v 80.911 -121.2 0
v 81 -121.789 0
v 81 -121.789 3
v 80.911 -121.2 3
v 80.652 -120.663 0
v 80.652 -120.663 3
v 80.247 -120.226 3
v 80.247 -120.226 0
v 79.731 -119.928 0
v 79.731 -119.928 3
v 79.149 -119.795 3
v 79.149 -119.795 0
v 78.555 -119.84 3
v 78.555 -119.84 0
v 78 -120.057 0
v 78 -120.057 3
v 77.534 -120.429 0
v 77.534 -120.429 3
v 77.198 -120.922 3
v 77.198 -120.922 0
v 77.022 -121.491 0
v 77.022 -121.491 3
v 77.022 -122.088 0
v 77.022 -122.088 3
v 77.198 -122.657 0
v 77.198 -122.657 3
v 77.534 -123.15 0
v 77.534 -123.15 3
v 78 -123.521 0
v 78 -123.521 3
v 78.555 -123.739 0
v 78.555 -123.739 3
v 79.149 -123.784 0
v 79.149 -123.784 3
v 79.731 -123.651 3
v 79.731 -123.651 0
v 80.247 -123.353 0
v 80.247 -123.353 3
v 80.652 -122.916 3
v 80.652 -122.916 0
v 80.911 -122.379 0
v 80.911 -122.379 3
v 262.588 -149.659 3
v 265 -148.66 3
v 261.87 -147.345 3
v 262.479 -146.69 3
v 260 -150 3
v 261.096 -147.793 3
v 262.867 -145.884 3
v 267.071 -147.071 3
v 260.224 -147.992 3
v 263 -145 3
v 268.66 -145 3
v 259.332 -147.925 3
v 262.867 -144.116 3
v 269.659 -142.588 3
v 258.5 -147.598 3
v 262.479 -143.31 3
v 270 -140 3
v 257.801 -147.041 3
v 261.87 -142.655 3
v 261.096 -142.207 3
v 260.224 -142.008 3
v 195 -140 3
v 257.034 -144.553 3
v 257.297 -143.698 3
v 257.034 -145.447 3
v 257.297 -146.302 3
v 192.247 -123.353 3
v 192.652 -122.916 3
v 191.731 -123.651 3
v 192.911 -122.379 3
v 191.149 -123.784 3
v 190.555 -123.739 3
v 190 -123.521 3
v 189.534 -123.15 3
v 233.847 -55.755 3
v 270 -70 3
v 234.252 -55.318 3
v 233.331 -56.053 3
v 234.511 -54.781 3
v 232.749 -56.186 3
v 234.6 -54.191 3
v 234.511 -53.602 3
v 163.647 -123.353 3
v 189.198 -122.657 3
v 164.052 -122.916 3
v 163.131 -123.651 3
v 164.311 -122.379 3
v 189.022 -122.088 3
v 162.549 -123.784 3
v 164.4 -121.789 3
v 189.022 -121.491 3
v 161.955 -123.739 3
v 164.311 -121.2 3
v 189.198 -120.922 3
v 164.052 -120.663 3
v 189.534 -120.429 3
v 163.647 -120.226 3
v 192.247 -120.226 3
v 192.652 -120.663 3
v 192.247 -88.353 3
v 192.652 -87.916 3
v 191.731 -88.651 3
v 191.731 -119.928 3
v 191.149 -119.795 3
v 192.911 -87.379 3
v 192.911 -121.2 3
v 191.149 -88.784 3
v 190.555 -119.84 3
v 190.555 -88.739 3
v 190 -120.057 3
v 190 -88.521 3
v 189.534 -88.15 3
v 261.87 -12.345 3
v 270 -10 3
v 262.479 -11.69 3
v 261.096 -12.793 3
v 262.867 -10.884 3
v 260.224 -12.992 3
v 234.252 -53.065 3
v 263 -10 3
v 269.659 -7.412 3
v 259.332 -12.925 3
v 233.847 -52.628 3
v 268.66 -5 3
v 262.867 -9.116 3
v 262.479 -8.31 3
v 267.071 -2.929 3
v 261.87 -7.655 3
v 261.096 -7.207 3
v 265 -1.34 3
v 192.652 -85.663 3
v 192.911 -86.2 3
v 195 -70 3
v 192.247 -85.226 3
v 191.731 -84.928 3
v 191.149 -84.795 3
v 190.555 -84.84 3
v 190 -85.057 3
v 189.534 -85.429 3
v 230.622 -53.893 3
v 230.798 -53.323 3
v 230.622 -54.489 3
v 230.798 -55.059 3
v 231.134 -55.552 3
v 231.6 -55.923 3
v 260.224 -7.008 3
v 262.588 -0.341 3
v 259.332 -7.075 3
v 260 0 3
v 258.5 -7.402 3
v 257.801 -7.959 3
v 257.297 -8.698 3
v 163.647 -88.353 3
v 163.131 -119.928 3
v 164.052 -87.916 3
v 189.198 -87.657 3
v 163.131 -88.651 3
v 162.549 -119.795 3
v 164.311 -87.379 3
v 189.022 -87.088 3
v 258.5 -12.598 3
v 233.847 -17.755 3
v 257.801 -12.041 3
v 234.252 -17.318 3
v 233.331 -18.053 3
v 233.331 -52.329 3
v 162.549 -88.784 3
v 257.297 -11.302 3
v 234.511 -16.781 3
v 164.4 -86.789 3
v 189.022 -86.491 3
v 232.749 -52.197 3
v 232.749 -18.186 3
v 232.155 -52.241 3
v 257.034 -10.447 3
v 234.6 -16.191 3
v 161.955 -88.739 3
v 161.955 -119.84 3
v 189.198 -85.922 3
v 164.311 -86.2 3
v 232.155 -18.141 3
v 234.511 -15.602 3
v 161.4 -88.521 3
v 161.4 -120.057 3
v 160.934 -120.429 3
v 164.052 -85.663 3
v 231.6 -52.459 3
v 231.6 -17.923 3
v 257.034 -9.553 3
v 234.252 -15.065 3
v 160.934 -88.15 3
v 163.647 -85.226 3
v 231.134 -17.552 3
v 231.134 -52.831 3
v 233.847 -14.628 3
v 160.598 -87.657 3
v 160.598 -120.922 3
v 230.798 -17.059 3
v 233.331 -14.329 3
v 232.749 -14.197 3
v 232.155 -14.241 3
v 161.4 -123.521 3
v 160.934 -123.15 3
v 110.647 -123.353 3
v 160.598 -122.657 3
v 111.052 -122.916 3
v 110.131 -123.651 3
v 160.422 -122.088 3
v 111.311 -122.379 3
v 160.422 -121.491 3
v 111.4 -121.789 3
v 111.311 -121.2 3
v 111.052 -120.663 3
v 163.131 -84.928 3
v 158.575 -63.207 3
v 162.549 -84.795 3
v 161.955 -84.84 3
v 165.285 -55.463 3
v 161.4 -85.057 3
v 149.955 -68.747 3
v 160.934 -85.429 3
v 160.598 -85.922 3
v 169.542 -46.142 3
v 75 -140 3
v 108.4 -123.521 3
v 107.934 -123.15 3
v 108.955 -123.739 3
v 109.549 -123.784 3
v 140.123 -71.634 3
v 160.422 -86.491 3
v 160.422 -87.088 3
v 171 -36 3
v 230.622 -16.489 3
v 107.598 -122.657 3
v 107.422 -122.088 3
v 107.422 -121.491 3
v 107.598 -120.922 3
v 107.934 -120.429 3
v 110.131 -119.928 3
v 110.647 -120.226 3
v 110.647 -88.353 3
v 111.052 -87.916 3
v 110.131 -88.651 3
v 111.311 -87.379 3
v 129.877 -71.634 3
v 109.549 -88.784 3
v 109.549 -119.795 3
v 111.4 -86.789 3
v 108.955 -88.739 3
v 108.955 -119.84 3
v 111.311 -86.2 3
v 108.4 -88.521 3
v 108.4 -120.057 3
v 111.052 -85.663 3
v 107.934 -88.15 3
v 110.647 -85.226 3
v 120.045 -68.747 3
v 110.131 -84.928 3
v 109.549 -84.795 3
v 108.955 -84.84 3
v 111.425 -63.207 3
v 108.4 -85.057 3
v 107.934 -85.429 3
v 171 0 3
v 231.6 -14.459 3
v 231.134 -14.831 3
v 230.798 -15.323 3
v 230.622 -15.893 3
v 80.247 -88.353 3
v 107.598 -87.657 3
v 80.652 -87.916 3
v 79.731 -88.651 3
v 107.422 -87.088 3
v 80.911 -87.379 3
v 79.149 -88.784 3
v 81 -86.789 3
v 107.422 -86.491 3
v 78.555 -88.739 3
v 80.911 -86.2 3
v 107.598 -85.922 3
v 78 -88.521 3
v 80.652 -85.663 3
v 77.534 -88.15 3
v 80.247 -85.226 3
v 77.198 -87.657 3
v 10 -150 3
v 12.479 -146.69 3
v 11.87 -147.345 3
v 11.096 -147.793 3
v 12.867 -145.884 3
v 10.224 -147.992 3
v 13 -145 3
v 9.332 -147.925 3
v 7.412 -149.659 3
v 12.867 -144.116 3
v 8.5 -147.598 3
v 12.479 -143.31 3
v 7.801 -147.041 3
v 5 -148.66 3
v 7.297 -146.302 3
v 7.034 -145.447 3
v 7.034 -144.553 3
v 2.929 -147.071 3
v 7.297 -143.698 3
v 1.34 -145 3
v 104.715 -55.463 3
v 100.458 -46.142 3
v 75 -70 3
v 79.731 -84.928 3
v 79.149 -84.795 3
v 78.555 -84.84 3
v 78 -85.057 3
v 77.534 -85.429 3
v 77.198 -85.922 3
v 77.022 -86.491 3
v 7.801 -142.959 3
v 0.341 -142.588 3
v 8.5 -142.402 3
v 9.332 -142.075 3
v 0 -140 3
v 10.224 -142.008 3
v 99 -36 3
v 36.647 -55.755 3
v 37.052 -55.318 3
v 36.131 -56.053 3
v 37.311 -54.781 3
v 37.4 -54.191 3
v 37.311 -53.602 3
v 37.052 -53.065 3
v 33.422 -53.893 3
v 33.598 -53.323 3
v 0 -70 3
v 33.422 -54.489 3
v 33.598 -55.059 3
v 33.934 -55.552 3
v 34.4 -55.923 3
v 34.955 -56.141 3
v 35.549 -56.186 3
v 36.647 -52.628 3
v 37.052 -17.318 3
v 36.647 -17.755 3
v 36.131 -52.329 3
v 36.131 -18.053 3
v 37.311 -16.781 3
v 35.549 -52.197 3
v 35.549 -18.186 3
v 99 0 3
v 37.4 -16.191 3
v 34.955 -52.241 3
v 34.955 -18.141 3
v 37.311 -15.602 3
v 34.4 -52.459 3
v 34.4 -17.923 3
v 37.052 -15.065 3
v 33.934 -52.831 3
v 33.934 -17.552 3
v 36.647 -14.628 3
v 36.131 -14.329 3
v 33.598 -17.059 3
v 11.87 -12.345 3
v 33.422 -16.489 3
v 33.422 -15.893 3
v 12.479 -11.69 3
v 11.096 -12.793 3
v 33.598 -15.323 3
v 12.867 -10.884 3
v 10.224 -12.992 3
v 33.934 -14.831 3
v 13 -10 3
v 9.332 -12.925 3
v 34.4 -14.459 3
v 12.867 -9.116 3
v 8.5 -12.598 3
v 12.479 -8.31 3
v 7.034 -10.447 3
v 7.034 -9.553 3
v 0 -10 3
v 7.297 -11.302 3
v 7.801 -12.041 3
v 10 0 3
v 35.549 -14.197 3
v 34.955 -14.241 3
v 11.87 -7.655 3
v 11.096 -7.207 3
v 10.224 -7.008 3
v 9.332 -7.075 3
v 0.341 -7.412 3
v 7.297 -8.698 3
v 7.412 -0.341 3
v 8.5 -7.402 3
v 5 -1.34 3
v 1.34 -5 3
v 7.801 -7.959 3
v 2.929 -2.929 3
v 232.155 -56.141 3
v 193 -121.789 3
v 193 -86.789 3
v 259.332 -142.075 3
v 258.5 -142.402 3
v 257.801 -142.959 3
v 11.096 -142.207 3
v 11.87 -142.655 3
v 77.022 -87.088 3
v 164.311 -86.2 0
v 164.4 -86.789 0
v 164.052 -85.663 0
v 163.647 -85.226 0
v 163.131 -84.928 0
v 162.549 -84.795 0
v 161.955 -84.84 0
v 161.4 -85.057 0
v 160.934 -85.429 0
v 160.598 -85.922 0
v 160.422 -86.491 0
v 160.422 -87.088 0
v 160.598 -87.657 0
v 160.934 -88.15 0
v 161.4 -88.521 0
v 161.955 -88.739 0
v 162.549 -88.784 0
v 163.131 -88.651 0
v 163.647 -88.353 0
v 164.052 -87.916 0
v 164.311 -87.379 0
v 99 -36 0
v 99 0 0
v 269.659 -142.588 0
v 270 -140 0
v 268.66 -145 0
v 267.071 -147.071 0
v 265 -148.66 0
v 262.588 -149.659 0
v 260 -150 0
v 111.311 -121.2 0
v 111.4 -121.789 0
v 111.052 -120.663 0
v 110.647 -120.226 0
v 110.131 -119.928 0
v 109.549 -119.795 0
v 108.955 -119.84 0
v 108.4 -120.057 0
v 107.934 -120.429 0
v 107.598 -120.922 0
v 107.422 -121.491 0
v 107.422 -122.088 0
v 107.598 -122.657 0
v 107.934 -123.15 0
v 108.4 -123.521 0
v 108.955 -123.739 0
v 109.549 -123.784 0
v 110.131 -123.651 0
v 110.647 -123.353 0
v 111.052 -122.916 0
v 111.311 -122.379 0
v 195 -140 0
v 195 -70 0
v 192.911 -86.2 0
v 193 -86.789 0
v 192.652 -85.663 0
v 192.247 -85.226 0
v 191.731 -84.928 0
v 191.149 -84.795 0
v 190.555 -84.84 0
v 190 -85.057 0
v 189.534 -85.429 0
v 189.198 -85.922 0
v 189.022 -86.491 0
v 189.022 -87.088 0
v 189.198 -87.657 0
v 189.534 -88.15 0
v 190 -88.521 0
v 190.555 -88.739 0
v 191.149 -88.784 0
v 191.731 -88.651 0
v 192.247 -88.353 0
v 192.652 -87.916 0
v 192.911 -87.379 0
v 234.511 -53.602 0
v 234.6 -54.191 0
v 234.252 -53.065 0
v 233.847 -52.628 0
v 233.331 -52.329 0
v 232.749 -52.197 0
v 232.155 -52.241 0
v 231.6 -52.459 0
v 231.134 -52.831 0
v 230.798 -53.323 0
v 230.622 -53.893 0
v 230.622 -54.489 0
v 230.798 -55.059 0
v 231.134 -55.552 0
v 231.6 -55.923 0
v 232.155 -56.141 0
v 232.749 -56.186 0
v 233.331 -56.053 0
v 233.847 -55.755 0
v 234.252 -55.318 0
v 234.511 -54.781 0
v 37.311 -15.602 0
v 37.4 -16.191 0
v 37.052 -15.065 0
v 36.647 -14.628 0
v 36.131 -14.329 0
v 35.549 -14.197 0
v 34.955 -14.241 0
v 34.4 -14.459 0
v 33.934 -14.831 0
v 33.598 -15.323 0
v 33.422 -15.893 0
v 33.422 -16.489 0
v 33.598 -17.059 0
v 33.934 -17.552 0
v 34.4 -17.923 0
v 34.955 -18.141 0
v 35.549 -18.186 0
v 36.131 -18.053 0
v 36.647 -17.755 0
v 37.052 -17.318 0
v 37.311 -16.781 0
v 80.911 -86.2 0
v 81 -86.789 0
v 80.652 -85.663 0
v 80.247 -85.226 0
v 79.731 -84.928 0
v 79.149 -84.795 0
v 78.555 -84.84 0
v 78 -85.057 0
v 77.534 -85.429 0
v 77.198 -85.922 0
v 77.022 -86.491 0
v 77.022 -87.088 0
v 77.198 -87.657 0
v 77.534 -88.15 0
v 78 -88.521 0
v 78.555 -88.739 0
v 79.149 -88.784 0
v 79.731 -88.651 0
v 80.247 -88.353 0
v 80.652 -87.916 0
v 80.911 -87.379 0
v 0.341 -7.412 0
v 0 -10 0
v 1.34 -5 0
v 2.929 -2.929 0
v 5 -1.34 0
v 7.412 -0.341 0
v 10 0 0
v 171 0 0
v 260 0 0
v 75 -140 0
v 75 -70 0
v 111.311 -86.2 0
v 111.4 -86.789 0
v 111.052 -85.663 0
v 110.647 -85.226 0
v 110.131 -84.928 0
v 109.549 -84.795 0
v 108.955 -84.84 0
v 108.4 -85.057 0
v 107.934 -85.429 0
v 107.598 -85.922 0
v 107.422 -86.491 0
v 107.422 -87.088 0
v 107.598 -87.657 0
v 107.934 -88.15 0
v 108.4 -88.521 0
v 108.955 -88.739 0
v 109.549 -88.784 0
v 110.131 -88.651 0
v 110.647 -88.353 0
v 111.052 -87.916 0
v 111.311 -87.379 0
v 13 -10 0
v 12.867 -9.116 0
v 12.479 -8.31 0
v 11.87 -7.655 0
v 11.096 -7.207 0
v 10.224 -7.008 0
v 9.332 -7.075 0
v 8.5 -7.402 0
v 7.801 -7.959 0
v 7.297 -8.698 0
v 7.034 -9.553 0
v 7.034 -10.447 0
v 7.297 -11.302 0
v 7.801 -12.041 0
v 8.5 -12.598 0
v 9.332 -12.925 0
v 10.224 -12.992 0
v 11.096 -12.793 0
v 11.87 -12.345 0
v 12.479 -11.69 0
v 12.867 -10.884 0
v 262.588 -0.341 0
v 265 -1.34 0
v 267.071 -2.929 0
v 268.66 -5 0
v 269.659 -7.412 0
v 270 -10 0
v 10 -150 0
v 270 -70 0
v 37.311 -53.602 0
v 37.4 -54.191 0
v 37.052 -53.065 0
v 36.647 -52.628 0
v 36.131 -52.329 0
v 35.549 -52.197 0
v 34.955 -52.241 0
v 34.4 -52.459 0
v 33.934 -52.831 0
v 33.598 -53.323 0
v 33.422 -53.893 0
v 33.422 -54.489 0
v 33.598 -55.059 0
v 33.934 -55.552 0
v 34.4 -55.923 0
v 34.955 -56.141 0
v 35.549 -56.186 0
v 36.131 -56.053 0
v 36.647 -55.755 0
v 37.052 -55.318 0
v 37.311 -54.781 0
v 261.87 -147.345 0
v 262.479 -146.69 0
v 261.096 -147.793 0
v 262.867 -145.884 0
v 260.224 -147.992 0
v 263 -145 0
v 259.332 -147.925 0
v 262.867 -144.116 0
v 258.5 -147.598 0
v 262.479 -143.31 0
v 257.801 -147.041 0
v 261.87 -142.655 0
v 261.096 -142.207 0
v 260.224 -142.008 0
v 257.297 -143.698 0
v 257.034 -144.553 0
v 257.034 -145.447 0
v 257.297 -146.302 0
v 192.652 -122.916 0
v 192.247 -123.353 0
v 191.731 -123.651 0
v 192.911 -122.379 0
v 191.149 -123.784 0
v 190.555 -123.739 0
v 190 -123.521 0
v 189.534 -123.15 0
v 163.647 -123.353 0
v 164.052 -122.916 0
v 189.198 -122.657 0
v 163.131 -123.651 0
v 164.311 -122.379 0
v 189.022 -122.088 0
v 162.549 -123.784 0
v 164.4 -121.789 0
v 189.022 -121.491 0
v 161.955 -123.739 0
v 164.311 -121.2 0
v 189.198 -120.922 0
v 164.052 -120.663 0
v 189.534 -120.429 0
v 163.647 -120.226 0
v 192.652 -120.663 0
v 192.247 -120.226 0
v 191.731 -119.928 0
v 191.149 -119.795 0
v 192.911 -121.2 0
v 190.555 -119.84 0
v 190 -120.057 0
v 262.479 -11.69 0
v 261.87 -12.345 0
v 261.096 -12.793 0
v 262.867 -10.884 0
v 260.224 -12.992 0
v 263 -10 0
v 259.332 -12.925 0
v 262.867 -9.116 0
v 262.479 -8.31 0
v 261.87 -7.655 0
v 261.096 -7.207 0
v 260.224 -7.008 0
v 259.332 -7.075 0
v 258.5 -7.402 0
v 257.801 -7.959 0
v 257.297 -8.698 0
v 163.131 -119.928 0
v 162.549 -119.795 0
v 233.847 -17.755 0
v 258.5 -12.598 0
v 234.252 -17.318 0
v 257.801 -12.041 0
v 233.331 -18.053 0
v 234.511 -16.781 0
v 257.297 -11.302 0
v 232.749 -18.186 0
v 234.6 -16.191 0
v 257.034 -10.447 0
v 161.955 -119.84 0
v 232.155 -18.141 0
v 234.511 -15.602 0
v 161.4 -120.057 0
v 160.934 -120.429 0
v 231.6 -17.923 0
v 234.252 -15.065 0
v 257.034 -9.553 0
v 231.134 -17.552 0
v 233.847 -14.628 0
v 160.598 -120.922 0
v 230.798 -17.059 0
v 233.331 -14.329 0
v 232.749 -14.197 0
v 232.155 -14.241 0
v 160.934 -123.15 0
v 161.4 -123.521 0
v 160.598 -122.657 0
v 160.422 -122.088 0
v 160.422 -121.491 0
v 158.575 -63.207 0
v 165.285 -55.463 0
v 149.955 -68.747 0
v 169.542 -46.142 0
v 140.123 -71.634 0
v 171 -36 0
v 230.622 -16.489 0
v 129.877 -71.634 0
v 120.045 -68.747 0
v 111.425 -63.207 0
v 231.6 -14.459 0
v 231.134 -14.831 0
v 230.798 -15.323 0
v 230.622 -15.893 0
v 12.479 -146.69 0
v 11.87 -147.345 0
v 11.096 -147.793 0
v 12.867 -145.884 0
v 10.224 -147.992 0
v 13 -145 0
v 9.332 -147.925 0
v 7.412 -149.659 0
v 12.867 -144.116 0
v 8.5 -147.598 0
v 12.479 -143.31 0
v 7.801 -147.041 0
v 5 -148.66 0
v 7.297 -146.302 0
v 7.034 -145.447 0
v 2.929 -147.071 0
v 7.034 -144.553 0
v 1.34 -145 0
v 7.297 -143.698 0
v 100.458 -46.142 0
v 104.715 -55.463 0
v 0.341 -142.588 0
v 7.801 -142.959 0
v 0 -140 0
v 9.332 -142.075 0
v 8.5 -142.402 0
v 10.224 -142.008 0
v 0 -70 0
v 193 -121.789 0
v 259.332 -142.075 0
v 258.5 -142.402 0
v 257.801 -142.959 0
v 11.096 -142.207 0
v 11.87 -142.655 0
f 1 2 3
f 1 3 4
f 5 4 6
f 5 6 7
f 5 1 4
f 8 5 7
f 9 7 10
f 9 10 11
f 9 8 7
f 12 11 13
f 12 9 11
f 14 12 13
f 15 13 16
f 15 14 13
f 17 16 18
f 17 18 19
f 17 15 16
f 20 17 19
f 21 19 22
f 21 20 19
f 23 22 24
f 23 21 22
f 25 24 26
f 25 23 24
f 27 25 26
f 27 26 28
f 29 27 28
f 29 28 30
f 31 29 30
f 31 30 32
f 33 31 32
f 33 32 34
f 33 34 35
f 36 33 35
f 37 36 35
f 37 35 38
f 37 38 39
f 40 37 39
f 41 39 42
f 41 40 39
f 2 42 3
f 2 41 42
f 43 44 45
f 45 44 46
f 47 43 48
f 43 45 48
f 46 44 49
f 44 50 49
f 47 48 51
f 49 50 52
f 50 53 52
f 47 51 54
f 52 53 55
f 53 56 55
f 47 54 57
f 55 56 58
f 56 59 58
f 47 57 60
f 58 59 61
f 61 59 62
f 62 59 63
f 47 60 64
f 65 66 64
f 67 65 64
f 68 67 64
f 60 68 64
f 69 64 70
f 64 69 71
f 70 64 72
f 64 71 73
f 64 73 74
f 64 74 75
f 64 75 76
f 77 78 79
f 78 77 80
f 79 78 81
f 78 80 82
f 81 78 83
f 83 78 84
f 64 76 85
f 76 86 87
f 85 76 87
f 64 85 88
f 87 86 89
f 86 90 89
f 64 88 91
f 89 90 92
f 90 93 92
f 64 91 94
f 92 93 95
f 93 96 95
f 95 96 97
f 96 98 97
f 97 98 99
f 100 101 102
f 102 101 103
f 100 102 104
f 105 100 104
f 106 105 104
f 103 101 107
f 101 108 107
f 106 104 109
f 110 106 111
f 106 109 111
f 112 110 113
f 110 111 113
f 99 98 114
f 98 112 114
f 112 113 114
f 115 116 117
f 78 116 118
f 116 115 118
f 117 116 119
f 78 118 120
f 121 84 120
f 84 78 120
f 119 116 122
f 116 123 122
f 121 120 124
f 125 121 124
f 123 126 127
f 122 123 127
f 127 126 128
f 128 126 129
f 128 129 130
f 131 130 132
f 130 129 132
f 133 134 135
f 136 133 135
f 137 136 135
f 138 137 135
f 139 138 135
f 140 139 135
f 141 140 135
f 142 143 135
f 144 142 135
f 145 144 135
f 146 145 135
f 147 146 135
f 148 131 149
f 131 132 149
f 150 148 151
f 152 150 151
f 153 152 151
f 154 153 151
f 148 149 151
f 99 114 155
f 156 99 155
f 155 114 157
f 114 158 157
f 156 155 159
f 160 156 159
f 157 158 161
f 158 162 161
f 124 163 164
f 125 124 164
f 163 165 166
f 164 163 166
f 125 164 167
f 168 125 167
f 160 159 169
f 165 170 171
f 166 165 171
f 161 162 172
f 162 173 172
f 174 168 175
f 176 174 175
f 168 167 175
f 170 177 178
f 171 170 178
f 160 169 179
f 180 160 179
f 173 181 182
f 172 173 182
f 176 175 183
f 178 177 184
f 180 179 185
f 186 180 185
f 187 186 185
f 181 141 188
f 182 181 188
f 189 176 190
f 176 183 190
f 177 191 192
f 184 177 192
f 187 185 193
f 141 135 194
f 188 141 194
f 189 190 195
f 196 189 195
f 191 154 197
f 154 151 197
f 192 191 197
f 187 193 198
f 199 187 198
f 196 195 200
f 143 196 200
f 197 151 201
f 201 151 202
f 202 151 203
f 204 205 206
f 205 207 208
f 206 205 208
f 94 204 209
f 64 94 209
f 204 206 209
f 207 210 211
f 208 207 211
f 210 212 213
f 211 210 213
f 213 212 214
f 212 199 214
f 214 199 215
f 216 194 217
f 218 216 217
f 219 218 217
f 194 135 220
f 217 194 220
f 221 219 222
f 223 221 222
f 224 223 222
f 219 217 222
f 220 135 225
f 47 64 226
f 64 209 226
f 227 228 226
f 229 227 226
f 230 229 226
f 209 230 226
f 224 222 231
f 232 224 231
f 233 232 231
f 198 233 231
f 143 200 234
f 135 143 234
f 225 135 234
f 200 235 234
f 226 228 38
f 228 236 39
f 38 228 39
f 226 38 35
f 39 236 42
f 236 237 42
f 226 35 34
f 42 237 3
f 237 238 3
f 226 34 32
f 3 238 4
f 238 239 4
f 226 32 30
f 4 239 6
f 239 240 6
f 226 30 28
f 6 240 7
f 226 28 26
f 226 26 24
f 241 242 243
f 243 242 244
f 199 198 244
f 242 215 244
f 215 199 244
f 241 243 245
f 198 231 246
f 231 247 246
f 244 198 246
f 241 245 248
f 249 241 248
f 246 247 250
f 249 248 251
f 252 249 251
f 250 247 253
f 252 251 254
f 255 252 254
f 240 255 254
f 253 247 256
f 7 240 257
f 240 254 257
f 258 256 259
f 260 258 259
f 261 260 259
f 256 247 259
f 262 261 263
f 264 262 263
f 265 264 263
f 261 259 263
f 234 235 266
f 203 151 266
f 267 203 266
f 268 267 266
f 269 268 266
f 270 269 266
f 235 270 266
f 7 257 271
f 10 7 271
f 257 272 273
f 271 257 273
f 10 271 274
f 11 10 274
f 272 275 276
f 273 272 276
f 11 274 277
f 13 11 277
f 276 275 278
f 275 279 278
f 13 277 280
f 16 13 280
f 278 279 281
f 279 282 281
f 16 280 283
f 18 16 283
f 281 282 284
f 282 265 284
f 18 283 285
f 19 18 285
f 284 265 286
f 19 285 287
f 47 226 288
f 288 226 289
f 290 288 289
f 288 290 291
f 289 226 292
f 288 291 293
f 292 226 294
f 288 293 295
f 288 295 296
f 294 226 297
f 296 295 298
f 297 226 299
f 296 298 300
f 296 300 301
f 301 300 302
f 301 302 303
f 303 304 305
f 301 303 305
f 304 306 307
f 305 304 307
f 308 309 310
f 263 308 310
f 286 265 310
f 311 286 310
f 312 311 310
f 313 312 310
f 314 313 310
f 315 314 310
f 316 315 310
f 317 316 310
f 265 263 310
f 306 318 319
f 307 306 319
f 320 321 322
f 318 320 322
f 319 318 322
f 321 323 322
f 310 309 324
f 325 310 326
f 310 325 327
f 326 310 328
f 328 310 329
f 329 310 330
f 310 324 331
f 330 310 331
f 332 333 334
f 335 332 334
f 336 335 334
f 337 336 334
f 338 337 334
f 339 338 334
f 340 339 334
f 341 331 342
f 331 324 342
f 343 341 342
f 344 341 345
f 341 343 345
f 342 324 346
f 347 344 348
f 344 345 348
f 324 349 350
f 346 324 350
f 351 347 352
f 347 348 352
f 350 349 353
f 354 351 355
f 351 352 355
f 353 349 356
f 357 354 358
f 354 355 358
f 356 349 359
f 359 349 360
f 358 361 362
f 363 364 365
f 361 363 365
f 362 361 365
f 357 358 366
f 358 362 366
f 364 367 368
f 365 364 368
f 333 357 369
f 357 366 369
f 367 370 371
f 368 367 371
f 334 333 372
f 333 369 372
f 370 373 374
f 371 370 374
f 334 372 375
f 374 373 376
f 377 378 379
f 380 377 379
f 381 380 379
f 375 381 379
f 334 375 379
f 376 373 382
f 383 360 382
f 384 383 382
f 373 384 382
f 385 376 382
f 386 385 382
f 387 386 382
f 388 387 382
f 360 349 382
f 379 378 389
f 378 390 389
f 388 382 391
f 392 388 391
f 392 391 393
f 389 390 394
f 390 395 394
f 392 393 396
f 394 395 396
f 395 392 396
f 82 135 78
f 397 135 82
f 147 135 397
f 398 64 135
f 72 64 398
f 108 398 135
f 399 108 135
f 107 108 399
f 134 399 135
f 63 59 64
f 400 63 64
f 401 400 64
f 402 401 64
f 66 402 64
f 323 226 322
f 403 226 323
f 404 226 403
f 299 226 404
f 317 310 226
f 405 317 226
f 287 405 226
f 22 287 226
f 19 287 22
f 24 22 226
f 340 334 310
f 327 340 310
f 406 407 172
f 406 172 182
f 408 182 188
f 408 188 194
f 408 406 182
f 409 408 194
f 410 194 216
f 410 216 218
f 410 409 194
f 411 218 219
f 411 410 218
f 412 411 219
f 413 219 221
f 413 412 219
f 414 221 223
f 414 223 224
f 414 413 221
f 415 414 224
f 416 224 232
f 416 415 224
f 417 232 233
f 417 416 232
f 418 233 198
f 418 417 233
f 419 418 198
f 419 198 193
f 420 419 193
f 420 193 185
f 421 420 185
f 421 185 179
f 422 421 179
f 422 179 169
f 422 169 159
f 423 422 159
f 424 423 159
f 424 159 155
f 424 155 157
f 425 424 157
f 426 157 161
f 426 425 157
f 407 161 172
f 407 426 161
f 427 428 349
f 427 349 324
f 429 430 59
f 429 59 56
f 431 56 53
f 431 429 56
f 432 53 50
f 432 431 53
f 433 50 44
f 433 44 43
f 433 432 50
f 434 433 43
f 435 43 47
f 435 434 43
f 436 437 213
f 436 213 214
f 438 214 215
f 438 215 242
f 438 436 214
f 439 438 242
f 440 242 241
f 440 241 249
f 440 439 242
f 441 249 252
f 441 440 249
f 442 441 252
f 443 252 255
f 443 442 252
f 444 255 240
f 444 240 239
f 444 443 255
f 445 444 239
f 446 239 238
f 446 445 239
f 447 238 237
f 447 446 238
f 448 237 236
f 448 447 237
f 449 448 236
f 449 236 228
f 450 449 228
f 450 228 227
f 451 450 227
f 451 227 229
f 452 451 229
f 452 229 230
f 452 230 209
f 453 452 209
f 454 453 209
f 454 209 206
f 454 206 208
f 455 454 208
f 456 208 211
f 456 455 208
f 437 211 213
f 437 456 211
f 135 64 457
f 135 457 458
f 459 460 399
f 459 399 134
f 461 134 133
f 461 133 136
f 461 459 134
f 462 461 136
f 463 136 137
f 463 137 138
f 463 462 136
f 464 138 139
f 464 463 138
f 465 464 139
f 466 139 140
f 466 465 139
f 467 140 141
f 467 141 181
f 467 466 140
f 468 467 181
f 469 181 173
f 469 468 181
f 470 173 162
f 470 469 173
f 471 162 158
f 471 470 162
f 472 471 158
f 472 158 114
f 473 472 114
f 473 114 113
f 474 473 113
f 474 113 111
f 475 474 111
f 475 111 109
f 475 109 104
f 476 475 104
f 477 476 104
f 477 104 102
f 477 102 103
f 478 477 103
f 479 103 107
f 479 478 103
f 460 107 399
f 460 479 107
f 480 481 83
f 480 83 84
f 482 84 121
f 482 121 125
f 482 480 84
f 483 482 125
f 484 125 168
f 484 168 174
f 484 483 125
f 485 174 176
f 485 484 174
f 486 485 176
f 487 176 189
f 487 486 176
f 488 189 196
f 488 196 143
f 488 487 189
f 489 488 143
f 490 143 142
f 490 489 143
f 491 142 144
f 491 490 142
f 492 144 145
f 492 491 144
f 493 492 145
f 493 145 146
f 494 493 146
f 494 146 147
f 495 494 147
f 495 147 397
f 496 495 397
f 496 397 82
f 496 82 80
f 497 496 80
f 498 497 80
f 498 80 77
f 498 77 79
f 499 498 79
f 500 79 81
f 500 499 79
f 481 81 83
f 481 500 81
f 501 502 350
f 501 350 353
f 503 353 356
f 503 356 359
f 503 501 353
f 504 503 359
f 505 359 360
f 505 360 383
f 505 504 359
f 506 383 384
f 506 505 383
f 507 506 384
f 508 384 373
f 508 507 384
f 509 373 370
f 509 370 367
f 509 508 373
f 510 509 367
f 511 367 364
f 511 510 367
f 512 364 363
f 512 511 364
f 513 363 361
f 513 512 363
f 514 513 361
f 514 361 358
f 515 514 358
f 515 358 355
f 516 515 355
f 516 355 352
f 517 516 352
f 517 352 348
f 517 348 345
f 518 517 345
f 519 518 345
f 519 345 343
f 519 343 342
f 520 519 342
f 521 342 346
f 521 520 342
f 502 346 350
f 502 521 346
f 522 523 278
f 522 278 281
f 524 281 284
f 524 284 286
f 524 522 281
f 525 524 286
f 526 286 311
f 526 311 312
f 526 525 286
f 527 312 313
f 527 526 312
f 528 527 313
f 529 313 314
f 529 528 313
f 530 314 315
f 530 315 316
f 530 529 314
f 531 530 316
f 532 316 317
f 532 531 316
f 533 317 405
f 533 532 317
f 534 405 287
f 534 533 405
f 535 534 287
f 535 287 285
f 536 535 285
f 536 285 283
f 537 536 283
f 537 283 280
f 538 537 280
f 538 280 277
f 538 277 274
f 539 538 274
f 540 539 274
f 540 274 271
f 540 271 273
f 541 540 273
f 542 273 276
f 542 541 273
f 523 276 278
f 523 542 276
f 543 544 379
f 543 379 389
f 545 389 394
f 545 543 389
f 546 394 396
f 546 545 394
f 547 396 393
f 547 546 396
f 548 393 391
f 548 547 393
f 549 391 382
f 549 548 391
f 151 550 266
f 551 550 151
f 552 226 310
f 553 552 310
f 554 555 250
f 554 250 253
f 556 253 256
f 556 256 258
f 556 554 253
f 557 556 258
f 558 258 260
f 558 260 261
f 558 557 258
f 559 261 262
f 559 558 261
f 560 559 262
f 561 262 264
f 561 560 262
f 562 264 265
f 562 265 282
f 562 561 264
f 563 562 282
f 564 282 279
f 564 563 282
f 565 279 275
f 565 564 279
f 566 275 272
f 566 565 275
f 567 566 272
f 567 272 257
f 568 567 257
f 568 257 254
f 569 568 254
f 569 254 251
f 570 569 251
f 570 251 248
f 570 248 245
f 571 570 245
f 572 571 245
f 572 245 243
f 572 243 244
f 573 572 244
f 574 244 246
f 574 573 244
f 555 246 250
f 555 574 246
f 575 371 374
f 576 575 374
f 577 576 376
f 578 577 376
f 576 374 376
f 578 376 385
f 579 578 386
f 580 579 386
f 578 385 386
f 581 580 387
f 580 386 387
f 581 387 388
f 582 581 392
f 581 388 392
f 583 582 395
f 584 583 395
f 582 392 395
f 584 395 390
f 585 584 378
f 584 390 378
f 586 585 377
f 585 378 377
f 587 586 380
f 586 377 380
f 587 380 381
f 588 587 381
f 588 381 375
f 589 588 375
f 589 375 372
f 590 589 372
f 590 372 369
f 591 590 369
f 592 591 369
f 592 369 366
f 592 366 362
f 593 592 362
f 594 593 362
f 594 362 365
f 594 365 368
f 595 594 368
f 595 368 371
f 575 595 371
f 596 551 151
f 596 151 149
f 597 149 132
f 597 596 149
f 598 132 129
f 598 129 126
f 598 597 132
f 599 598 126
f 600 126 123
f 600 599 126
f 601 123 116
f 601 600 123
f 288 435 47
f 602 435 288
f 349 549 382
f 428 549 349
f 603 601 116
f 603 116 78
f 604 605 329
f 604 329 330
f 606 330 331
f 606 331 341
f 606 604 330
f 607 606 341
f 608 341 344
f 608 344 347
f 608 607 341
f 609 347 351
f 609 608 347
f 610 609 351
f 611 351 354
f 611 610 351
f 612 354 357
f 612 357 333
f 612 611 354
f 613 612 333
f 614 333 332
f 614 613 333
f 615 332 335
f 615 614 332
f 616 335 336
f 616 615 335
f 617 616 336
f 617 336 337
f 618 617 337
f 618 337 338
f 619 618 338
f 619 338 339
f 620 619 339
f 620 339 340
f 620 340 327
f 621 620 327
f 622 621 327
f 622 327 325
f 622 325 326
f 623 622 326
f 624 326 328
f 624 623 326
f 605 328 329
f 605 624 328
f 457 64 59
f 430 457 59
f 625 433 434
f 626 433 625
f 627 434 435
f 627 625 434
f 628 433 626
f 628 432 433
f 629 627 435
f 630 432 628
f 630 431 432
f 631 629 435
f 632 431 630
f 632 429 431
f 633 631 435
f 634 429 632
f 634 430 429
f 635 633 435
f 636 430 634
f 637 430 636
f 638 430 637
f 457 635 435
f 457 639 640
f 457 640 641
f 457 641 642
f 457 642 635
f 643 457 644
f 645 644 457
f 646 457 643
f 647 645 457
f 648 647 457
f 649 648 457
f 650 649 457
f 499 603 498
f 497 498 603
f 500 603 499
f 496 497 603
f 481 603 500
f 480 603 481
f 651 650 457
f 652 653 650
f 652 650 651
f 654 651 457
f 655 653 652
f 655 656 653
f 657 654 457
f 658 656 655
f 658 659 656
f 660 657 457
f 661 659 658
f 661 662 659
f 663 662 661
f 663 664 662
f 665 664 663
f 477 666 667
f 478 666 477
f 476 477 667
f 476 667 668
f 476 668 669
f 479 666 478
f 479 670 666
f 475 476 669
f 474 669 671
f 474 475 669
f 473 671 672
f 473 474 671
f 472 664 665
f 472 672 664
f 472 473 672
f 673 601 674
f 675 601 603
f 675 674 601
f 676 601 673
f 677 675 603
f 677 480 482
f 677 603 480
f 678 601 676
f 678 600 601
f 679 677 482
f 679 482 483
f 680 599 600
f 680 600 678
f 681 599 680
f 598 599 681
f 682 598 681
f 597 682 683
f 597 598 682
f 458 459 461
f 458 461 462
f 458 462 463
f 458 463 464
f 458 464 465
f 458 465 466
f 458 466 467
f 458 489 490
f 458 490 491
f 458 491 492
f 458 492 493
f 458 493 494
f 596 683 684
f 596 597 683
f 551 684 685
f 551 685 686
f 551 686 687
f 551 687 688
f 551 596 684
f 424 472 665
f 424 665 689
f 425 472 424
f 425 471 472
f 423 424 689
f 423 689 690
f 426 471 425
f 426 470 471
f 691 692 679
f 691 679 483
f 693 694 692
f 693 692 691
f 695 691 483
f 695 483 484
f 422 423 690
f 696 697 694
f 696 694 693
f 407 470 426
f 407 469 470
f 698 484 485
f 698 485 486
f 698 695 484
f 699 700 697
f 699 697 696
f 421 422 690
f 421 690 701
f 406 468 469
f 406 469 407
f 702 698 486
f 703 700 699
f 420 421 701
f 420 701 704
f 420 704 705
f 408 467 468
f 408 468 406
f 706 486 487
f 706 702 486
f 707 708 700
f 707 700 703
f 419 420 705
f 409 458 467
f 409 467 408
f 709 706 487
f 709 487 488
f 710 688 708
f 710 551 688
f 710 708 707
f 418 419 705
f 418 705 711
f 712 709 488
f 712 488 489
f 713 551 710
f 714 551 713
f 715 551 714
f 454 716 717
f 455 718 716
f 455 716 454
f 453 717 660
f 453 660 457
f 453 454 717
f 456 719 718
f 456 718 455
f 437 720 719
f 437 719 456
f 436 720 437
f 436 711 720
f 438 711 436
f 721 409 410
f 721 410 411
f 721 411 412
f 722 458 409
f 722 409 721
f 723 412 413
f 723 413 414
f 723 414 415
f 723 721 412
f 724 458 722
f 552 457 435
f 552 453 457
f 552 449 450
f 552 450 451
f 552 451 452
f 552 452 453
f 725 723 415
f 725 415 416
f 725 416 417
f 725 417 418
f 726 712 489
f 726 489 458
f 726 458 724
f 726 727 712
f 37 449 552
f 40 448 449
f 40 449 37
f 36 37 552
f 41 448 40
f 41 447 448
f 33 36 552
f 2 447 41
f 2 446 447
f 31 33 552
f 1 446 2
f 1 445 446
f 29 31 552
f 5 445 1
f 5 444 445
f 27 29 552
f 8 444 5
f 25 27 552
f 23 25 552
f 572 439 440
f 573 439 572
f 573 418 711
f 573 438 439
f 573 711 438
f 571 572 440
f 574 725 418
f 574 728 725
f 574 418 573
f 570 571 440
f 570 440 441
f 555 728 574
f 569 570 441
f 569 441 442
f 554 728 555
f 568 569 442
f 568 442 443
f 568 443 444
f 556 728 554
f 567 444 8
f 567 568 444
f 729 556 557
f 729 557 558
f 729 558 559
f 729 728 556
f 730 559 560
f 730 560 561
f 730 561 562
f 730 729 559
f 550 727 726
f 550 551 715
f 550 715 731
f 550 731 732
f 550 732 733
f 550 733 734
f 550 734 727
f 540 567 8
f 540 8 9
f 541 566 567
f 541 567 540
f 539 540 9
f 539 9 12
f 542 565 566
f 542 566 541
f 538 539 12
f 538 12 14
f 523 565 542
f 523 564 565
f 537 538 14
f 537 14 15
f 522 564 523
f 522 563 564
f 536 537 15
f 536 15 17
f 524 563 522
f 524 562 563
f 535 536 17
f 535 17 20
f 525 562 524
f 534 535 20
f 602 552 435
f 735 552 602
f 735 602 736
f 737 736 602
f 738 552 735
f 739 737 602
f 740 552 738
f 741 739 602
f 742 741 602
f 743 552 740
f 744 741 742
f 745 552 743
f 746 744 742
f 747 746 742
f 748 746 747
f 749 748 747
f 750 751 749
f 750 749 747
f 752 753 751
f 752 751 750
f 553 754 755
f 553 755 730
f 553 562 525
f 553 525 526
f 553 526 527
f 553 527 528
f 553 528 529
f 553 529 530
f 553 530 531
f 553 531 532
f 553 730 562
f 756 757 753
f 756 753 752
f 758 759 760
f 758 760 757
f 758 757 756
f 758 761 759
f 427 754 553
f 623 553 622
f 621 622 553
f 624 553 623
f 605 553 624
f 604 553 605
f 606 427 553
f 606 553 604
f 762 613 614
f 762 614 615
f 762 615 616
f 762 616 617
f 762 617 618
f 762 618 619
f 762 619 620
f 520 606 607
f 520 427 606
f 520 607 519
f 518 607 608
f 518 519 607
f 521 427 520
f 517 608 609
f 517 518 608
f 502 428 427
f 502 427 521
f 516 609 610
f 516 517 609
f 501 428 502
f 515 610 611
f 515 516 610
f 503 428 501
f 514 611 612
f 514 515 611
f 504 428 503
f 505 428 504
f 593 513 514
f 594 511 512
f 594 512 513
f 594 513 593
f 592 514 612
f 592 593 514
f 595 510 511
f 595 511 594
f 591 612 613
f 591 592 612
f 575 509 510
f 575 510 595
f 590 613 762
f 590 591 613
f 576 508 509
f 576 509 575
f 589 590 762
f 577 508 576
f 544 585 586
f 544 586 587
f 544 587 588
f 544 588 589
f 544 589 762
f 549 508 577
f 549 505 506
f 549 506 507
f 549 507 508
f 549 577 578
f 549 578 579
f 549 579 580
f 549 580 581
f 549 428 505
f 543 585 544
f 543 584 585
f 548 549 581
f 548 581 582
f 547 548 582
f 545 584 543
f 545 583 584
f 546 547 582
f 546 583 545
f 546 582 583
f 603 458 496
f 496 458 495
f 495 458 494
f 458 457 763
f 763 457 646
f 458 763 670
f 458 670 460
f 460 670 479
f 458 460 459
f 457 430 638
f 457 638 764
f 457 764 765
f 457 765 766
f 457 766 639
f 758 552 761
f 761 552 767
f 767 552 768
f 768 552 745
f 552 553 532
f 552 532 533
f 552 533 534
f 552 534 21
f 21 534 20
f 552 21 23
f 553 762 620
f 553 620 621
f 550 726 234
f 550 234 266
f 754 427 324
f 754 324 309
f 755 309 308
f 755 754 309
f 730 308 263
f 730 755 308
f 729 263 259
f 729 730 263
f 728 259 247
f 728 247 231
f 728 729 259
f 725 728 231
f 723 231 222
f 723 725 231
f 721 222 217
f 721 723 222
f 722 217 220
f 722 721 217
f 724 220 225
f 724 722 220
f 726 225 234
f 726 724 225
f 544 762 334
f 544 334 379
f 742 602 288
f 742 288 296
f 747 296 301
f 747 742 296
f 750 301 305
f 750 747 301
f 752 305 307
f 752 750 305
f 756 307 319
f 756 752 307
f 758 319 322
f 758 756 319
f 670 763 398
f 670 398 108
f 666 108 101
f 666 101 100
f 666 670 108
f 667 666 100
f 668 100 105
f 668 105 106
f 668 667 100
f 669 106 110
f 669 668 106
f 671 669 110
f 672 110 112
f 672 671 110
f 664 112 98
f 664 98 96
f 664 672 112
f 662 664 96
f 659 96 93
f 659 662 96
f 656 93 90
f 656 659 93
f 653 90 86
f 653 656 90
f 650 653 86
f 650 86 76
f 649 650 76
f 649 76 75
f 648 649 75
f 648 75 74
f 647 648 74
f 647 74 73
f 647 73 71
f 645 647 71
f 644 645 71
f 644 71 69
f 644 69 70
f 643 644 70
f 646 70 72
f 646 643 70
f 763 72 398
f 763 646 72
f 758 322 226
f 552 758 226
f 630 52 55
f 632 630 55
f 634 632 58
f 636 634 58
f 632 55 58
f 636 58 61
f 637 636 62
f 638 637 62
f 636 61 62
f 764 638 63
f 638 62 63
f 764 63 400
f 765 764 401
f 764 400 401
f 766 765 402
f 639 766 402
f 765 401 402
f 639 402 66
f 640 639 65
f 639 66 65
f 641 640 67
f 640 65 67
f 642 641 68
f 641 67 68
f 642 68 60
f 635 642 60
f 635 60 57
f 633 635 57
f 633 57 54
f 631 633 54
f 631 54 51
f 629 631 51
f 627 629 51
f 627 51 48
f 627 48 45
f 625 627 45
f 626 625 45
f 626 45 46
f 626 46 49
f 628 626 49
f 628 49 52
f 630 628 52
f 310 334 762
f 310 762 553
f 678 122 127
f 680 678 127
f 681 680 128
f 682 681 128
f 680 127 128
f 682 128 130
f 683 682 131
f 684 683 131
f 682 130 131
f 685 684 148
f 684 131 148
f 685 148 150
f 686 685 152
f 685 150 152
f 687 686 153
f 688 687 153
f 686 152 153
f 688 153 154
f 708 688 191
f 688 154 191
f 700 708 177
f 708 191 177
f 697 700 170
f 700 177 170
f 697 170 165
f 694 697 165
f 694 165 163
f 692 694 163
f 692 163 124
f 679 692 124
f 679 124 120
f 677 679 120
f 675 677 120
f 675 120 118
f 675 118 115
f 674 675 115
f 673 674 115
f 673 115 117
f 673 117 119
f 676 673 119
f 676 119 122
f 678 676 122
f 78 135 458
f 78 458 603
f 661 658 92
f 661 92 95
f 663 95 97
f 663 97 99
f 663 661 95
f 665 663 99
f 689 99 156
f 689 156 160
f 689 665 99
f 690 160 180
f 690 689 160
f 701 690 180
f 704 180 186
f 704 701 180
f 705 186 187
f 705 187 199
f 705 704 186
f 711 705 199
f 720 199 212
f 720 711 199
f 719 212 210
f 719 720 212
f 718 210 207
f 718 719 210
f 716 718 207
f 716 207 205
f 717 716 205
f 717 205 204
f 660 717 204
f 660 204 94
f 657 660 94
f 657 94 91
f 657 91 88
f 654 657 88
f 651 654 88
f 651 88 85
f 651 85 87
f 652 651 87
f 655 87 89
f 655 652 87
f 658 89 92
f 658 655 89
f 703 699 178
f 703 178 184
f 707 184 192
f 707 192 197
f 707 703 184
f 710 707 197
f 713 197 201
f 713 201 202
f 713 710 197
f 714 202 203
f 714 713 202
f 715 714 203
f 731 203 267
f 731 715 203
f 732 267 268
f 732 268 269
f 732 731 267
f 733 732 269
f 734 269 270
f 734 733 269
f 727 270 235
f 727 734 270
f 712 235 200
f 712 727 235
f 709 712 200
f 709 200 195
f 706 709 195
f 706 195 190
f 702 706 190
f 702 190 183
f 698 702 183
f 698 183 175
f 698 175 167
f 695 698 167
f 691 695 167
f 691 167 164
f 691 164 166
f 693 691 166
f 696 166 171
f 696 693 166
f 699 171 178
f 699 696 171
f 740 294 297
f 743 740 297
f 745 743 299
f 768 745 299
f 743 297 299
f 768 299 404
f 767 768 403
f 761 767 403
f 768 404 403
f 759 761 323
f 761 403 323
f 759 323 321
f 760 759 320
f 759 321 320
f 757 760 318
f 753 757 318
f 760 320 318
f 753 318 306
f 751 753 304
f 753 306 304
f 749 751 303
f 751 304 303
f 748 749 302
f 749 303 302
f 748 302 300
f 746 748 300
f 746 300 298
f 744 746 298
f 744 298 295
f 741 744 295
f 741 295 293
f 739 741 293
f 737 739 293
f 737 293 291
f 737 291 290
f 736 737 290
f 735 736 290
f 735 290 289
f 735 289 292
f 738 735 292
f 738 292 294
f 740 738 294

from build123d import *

# Parameters (mm, degrees)
ESQUISSE1_R             = 2
BOSS_EXTRU_1_DEPTH      = 3
ESQUISSE2_W             = 75
ESQUISSE2_H             = 70
ENL_V_MAT_EXTRU_1_DEPTH = 3
ESQUISSE3_R             = 3
ENL_V_MAT_EXTRU_2_DEPTH = 10


with BuildPart() as part:
    # Esquisse1 → Boss.-Extru.1 (new body)
    with BuildSketch(Plane.XY):
        with BuildLine():
            Line((10, 0), (99, 0))
            Line((99, 0), (99, -36))
            ThreePointArc((99, -36), (135, -72), (171, -36))
            Line((171, -36), (171, 0))
            Line((171, 0), (260, 0))
            ThreePointArc((260, 0), (267.071067812, -2.928932188), (270, -10))
            Line((270, -10), (270, -140))
            ThreePointArc((270, -140), (267.071067812, -147.071067812), (260, -150))
            Line((260, -150), (10, -150))
            ThreePointArc((10, -150), (2.928932188, -147.071067812), (0, -140))
            Line((0, -140), (0, -10))
            ThreePointArc((0, -10), (2.928932188, -2.928932188), (10, 0))
        make_face()
        with Locations((109.4, -121.789429788)):
            Circle(ESQUISSE1_R, mode=Mode.SUBTRACT)
        with Locations((109.4, -86.789429788)):
            Circle(ESQUISSE1_R, mode=Mode.SUBTRACT)
        with Locations((79, -121.789429788)):
            Circle(ESQUISSE1_R, mode=Mode.SUBTRACT)
        with Locations((79, -86.789429788)):
            Circle(ESQUISSE1_R, mode=Mode.SUBTRACT)
        with Locations((162.4, -121.789429788)):
            Circle(ESQUISSE1_R, mode=Mode.SUBTRACT)
        with Locations((162.4, -86.789429788)):
            Circle(ESQUISSE1_R, mode=Mode.SUBTRACT)
        with Locations((191, -121.789429788)):
            Circle(ESQUISSE1_R, mode=Mode.SUBTRACT)
        with Locations((191, -86.789429788)):
            Circle(ESQUISSE1_R, mode=Mode.SUBTRACT)
        with Locations((35.4, -16.191238784)):
            Circle(ESQUISSE1_R, mode=Mode.SUBTRACT)
        with Locations((35.4, -54.191238784)):
            Circle(ESQUISSE1_R, mode=Mode.SUBTRACT)
        with Locations((232.6, -16.191238784)):
            Circle(ESQUISSE1_R, mode=Mode.SUBTRACT)
        with Locations((232.6, -54.191238784)):
            Circle(ESQUISSE1_R, mode=Mode.SUBTRACT)
    extrude(amount=BOSS_EXTRU_1_DEPTH)

    # Esquisse2 → Enlèv. mat.-Extru.1 (cut)
    with BuildSketch(Plane.XY.offset(3)):
        with Locations((37.5, -105)):
            Rectangle(ESQUISSE2_W, ESQUISSE2_H)
        with Locations((232.5, -105)):
            Rectangle(ESQUISSE2_W, ESQUISSE2_H)
    extrude(amount=-ENL_V_MAT_EXTRU_1_DEPTH, mode=Mode.SUBTRACT)

    # Esquisse3 → Enlèv. mat.-Extru.2 (cut)
    with BuildSketch(Plane.XY.offset(3)):
        with Locations((10, -10)):
            Circle(ESQUISSE3_R)
        with Locations((260, -10)):
            Circle(ESQUISSE3_R)
        with Locations((260, -145)):
            Circle(ESQUISSE3_R)
        with Locations((10, -145)):
            Circle(ESQUISSE3_R)
    extrude(amount=-ENL_V_MAT_EXTRU_2_DEPTH, mode=Mode.SUBTRACT)


solid = part.part
